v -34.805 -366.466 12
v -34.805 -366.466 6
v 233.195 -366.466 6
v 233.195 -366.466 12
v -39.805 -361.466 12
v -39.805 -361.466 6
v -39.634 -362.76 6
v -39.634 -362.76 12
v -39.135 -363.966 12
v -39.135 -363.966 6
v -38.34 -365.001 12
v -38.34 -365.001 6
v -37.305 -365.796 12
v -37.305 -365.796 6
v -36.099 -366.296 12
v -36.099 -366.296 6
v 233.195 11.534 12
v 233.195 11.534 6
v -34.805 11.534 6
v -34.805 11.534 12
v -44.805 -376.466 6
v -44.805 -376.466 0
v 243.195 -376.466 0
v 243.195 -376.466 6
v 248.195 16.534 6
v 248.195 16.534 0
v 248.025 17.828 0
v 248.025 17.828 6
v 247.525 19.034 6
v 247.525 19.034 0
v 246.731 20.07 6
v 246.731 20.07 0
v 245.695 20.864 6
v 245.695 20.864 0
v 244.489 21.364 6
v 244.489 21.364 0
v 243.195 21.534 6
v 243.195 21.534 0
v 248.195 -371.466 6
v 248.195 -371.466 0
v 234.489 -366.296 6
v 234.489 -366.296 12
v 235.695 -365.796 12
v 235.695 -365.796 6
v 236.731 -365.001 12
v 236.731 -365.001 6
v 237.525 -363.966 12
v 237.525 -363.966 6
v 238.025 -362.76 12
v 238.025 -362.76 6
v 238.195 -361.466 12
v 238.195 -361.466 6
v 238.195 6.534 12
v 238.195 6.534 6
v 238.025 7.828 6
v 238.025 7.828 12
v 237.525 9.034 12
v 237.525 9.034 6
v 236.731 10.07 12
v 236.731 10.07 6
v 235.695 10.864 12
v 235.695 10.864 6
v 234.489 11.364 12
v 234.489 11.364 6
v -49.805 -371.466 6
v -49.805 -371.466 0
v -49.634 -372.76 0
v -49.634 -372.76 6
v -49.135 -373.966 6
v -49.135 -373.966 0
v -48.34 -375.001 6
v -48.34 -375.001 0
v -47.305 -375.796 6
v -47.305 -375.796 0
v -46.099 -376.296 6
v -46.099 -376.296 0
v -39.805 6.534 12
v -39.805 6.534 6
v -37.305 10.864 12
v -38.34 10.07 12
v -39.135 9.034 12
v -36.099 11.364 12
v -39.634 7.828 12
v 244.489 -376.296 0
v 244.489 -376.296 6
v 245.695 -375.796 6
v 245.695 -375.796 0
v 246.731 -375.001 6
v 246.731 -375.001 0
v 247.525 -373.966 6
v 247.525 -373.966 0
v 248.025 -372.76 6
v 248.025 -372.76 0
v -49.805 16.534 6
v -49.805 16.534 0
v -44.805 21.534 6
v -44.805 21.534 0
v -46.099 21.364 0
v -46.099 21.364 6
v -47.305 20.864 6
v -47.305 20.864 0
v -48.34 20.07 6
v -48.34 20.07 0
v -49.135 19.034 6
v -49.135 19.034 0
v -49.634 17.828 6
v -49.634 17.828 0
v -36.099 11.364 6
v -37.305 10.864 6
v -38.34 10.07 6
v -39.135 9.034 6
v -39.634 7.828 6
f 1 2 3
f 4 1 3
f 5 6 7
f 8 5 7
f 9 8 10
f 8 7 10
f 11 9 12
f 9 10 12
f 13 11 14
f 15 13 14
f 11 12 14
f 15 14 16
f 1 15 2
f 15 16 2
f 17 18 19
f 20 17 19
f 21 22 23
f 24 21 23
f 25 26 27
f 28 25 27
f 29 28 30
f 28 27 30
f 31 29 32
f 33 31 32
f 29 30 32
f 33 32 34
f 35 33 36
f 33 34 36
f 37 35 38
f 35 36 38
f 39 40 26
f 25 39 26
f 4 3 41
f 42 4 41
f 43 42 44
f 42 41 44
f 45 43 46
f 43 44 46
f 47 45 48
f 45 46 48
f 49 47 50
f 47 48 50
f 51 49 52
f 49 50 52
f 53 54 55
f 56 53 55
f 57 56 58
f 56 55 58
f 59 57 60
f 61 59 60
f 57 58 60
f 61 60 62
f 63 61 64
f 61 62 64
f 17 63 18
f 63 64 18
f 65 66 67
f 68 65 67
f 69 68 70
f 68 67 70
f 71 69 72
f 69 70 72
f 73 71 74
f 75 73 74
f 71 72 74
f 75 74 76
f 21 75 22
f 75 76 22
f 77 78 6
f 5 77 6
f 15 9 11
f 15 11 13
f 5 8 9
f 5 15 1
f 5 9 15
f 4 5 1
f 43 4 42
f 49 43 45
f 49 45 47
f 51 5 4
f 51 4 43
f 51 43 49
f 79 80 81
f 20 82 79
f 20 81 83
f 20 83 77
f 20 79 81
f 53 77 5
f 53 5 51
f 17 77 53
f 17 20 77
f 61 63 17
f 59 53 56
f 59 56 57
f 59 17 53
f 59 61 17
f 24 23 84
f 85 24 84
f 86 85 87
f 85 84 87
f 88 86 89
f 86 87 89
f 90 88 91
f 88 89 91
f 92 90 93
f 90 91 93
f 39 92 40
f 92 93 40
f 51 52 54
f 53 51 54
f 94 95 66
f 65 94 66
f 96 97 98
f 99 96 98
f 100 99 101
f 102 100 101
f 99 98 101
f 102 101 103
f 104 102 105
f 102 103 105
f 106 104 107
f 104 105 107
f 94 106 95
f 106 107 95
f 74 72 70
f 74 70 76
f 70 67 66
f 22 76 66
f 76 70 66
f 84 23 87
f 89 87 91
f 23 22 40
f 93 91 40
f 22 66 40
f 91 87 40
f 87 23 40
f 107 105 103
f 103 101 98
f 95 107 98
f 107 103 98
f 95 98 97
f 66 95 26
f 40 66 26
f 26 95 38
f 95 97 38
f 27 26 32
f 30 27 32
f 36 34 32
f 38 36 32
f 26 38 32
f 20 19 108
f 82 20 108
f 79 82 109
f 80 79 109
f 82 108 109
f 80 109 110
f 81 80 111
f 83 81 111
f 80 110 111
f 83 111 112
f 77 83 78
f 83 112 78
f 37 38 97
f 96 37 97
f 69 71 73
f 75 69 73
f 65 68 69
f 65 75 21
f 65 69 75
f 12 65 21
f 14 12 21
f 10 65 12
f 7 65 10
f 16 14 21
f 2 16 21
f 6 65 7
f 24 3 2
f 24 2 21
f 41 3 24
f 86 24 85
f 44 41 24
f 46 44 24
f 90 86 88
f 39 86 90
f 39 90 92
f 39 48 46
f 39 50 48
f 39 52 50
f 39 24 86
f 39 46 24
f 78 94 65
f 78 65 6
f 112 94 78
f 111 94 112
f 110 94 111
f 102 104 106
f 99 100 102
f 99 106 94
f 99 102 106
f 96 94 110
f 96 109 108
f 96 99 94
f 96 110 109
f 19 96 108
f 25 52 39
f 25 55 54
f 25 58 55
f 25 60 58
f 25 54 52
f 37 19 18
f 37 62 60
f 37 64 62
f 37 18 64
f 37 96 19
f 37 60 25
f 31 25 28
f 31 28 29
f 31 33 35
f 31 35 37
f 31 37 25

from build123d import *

# Parameters (mm, degrees)
BOSS_EXTRUDE1_DEPTH = 6
BOSS_EXTRUDE2_DEPTH = 6


with BuildPart() as part:
    # Sketch1 → Boss-Extrude1 (new body)
    with BuildSketch(Plane.XY):
        with BuildLine():
            Line((-49.804736885, 16.53410644), (-49.804736885, -371.46589356))
            ThreePointArc((-49.804736885, -371.46589356), (-48.340270791, -375.001427466), (-44.804736885, -376.46589356))
            Line((-44.804736885, -376.46589356), (243.195263115, -376.46589356))
            ThreePointArc((243.195263115, -376.46589356), (246.730797021, -375.001427466), (248.195263115, -371.46589356))
            Line((248.195263115, -371.46589356), (248.195263115, 16.53410644))
            ThreePointArc((248.195263115, 16.53410644), (246.730797021, 20.069640346), (243.195263115, 21.53410644))
            Line((243.195263115, 21.53410644), (-44.804736885, 21.53410644))
            ThreePointArc((-44.804736885, 21.53410644), (-48.340270791, 20.069640346), (-49.804736885, 16.53410644))
        make_face()
    extrude(amount=BOSS_EXTRUDE1_DEPTH)

    # Sketch2 → Boss-Extrude2 (add)
    with BuildSketch(Plane.XY.offset(6)):
        with BuildLine():
            Line((-39.804736885, 6.53410644), (-39.804736885, -361.46589356))
            ThreePointArc((-39.804736885, -361.46589356), (-38.340270791, -365.001427466), (-34.804736885, -366.46589356))
            Line((-34.804736885, -366.46589356), (233.195263115, -366.46589356))
            ThreePointArc((233.195263115, -366.46589356), (236.730797021, -365.001427466), (238.195263115, -361.46589356))
            Line((238.195263115, -361.46589356), (238.195263115, 6.53410644))
            ThreePointArc((238.195263115, 6.53410644), (236.730797021, 10.069640346), (233.195263115, 11.53410644))
            Line((233.195263115, 11.53410644), (-34.804736885, 11.53410644))
            ThreePointArc((-34.804736885, 11.53410644), (-38.340270791, 10.069640346), (-39.804736885, 6.53410644))
        make_face()
    extrude(amount=BOSS_EXTRUDE2_DEPTH)


solid = part.part
